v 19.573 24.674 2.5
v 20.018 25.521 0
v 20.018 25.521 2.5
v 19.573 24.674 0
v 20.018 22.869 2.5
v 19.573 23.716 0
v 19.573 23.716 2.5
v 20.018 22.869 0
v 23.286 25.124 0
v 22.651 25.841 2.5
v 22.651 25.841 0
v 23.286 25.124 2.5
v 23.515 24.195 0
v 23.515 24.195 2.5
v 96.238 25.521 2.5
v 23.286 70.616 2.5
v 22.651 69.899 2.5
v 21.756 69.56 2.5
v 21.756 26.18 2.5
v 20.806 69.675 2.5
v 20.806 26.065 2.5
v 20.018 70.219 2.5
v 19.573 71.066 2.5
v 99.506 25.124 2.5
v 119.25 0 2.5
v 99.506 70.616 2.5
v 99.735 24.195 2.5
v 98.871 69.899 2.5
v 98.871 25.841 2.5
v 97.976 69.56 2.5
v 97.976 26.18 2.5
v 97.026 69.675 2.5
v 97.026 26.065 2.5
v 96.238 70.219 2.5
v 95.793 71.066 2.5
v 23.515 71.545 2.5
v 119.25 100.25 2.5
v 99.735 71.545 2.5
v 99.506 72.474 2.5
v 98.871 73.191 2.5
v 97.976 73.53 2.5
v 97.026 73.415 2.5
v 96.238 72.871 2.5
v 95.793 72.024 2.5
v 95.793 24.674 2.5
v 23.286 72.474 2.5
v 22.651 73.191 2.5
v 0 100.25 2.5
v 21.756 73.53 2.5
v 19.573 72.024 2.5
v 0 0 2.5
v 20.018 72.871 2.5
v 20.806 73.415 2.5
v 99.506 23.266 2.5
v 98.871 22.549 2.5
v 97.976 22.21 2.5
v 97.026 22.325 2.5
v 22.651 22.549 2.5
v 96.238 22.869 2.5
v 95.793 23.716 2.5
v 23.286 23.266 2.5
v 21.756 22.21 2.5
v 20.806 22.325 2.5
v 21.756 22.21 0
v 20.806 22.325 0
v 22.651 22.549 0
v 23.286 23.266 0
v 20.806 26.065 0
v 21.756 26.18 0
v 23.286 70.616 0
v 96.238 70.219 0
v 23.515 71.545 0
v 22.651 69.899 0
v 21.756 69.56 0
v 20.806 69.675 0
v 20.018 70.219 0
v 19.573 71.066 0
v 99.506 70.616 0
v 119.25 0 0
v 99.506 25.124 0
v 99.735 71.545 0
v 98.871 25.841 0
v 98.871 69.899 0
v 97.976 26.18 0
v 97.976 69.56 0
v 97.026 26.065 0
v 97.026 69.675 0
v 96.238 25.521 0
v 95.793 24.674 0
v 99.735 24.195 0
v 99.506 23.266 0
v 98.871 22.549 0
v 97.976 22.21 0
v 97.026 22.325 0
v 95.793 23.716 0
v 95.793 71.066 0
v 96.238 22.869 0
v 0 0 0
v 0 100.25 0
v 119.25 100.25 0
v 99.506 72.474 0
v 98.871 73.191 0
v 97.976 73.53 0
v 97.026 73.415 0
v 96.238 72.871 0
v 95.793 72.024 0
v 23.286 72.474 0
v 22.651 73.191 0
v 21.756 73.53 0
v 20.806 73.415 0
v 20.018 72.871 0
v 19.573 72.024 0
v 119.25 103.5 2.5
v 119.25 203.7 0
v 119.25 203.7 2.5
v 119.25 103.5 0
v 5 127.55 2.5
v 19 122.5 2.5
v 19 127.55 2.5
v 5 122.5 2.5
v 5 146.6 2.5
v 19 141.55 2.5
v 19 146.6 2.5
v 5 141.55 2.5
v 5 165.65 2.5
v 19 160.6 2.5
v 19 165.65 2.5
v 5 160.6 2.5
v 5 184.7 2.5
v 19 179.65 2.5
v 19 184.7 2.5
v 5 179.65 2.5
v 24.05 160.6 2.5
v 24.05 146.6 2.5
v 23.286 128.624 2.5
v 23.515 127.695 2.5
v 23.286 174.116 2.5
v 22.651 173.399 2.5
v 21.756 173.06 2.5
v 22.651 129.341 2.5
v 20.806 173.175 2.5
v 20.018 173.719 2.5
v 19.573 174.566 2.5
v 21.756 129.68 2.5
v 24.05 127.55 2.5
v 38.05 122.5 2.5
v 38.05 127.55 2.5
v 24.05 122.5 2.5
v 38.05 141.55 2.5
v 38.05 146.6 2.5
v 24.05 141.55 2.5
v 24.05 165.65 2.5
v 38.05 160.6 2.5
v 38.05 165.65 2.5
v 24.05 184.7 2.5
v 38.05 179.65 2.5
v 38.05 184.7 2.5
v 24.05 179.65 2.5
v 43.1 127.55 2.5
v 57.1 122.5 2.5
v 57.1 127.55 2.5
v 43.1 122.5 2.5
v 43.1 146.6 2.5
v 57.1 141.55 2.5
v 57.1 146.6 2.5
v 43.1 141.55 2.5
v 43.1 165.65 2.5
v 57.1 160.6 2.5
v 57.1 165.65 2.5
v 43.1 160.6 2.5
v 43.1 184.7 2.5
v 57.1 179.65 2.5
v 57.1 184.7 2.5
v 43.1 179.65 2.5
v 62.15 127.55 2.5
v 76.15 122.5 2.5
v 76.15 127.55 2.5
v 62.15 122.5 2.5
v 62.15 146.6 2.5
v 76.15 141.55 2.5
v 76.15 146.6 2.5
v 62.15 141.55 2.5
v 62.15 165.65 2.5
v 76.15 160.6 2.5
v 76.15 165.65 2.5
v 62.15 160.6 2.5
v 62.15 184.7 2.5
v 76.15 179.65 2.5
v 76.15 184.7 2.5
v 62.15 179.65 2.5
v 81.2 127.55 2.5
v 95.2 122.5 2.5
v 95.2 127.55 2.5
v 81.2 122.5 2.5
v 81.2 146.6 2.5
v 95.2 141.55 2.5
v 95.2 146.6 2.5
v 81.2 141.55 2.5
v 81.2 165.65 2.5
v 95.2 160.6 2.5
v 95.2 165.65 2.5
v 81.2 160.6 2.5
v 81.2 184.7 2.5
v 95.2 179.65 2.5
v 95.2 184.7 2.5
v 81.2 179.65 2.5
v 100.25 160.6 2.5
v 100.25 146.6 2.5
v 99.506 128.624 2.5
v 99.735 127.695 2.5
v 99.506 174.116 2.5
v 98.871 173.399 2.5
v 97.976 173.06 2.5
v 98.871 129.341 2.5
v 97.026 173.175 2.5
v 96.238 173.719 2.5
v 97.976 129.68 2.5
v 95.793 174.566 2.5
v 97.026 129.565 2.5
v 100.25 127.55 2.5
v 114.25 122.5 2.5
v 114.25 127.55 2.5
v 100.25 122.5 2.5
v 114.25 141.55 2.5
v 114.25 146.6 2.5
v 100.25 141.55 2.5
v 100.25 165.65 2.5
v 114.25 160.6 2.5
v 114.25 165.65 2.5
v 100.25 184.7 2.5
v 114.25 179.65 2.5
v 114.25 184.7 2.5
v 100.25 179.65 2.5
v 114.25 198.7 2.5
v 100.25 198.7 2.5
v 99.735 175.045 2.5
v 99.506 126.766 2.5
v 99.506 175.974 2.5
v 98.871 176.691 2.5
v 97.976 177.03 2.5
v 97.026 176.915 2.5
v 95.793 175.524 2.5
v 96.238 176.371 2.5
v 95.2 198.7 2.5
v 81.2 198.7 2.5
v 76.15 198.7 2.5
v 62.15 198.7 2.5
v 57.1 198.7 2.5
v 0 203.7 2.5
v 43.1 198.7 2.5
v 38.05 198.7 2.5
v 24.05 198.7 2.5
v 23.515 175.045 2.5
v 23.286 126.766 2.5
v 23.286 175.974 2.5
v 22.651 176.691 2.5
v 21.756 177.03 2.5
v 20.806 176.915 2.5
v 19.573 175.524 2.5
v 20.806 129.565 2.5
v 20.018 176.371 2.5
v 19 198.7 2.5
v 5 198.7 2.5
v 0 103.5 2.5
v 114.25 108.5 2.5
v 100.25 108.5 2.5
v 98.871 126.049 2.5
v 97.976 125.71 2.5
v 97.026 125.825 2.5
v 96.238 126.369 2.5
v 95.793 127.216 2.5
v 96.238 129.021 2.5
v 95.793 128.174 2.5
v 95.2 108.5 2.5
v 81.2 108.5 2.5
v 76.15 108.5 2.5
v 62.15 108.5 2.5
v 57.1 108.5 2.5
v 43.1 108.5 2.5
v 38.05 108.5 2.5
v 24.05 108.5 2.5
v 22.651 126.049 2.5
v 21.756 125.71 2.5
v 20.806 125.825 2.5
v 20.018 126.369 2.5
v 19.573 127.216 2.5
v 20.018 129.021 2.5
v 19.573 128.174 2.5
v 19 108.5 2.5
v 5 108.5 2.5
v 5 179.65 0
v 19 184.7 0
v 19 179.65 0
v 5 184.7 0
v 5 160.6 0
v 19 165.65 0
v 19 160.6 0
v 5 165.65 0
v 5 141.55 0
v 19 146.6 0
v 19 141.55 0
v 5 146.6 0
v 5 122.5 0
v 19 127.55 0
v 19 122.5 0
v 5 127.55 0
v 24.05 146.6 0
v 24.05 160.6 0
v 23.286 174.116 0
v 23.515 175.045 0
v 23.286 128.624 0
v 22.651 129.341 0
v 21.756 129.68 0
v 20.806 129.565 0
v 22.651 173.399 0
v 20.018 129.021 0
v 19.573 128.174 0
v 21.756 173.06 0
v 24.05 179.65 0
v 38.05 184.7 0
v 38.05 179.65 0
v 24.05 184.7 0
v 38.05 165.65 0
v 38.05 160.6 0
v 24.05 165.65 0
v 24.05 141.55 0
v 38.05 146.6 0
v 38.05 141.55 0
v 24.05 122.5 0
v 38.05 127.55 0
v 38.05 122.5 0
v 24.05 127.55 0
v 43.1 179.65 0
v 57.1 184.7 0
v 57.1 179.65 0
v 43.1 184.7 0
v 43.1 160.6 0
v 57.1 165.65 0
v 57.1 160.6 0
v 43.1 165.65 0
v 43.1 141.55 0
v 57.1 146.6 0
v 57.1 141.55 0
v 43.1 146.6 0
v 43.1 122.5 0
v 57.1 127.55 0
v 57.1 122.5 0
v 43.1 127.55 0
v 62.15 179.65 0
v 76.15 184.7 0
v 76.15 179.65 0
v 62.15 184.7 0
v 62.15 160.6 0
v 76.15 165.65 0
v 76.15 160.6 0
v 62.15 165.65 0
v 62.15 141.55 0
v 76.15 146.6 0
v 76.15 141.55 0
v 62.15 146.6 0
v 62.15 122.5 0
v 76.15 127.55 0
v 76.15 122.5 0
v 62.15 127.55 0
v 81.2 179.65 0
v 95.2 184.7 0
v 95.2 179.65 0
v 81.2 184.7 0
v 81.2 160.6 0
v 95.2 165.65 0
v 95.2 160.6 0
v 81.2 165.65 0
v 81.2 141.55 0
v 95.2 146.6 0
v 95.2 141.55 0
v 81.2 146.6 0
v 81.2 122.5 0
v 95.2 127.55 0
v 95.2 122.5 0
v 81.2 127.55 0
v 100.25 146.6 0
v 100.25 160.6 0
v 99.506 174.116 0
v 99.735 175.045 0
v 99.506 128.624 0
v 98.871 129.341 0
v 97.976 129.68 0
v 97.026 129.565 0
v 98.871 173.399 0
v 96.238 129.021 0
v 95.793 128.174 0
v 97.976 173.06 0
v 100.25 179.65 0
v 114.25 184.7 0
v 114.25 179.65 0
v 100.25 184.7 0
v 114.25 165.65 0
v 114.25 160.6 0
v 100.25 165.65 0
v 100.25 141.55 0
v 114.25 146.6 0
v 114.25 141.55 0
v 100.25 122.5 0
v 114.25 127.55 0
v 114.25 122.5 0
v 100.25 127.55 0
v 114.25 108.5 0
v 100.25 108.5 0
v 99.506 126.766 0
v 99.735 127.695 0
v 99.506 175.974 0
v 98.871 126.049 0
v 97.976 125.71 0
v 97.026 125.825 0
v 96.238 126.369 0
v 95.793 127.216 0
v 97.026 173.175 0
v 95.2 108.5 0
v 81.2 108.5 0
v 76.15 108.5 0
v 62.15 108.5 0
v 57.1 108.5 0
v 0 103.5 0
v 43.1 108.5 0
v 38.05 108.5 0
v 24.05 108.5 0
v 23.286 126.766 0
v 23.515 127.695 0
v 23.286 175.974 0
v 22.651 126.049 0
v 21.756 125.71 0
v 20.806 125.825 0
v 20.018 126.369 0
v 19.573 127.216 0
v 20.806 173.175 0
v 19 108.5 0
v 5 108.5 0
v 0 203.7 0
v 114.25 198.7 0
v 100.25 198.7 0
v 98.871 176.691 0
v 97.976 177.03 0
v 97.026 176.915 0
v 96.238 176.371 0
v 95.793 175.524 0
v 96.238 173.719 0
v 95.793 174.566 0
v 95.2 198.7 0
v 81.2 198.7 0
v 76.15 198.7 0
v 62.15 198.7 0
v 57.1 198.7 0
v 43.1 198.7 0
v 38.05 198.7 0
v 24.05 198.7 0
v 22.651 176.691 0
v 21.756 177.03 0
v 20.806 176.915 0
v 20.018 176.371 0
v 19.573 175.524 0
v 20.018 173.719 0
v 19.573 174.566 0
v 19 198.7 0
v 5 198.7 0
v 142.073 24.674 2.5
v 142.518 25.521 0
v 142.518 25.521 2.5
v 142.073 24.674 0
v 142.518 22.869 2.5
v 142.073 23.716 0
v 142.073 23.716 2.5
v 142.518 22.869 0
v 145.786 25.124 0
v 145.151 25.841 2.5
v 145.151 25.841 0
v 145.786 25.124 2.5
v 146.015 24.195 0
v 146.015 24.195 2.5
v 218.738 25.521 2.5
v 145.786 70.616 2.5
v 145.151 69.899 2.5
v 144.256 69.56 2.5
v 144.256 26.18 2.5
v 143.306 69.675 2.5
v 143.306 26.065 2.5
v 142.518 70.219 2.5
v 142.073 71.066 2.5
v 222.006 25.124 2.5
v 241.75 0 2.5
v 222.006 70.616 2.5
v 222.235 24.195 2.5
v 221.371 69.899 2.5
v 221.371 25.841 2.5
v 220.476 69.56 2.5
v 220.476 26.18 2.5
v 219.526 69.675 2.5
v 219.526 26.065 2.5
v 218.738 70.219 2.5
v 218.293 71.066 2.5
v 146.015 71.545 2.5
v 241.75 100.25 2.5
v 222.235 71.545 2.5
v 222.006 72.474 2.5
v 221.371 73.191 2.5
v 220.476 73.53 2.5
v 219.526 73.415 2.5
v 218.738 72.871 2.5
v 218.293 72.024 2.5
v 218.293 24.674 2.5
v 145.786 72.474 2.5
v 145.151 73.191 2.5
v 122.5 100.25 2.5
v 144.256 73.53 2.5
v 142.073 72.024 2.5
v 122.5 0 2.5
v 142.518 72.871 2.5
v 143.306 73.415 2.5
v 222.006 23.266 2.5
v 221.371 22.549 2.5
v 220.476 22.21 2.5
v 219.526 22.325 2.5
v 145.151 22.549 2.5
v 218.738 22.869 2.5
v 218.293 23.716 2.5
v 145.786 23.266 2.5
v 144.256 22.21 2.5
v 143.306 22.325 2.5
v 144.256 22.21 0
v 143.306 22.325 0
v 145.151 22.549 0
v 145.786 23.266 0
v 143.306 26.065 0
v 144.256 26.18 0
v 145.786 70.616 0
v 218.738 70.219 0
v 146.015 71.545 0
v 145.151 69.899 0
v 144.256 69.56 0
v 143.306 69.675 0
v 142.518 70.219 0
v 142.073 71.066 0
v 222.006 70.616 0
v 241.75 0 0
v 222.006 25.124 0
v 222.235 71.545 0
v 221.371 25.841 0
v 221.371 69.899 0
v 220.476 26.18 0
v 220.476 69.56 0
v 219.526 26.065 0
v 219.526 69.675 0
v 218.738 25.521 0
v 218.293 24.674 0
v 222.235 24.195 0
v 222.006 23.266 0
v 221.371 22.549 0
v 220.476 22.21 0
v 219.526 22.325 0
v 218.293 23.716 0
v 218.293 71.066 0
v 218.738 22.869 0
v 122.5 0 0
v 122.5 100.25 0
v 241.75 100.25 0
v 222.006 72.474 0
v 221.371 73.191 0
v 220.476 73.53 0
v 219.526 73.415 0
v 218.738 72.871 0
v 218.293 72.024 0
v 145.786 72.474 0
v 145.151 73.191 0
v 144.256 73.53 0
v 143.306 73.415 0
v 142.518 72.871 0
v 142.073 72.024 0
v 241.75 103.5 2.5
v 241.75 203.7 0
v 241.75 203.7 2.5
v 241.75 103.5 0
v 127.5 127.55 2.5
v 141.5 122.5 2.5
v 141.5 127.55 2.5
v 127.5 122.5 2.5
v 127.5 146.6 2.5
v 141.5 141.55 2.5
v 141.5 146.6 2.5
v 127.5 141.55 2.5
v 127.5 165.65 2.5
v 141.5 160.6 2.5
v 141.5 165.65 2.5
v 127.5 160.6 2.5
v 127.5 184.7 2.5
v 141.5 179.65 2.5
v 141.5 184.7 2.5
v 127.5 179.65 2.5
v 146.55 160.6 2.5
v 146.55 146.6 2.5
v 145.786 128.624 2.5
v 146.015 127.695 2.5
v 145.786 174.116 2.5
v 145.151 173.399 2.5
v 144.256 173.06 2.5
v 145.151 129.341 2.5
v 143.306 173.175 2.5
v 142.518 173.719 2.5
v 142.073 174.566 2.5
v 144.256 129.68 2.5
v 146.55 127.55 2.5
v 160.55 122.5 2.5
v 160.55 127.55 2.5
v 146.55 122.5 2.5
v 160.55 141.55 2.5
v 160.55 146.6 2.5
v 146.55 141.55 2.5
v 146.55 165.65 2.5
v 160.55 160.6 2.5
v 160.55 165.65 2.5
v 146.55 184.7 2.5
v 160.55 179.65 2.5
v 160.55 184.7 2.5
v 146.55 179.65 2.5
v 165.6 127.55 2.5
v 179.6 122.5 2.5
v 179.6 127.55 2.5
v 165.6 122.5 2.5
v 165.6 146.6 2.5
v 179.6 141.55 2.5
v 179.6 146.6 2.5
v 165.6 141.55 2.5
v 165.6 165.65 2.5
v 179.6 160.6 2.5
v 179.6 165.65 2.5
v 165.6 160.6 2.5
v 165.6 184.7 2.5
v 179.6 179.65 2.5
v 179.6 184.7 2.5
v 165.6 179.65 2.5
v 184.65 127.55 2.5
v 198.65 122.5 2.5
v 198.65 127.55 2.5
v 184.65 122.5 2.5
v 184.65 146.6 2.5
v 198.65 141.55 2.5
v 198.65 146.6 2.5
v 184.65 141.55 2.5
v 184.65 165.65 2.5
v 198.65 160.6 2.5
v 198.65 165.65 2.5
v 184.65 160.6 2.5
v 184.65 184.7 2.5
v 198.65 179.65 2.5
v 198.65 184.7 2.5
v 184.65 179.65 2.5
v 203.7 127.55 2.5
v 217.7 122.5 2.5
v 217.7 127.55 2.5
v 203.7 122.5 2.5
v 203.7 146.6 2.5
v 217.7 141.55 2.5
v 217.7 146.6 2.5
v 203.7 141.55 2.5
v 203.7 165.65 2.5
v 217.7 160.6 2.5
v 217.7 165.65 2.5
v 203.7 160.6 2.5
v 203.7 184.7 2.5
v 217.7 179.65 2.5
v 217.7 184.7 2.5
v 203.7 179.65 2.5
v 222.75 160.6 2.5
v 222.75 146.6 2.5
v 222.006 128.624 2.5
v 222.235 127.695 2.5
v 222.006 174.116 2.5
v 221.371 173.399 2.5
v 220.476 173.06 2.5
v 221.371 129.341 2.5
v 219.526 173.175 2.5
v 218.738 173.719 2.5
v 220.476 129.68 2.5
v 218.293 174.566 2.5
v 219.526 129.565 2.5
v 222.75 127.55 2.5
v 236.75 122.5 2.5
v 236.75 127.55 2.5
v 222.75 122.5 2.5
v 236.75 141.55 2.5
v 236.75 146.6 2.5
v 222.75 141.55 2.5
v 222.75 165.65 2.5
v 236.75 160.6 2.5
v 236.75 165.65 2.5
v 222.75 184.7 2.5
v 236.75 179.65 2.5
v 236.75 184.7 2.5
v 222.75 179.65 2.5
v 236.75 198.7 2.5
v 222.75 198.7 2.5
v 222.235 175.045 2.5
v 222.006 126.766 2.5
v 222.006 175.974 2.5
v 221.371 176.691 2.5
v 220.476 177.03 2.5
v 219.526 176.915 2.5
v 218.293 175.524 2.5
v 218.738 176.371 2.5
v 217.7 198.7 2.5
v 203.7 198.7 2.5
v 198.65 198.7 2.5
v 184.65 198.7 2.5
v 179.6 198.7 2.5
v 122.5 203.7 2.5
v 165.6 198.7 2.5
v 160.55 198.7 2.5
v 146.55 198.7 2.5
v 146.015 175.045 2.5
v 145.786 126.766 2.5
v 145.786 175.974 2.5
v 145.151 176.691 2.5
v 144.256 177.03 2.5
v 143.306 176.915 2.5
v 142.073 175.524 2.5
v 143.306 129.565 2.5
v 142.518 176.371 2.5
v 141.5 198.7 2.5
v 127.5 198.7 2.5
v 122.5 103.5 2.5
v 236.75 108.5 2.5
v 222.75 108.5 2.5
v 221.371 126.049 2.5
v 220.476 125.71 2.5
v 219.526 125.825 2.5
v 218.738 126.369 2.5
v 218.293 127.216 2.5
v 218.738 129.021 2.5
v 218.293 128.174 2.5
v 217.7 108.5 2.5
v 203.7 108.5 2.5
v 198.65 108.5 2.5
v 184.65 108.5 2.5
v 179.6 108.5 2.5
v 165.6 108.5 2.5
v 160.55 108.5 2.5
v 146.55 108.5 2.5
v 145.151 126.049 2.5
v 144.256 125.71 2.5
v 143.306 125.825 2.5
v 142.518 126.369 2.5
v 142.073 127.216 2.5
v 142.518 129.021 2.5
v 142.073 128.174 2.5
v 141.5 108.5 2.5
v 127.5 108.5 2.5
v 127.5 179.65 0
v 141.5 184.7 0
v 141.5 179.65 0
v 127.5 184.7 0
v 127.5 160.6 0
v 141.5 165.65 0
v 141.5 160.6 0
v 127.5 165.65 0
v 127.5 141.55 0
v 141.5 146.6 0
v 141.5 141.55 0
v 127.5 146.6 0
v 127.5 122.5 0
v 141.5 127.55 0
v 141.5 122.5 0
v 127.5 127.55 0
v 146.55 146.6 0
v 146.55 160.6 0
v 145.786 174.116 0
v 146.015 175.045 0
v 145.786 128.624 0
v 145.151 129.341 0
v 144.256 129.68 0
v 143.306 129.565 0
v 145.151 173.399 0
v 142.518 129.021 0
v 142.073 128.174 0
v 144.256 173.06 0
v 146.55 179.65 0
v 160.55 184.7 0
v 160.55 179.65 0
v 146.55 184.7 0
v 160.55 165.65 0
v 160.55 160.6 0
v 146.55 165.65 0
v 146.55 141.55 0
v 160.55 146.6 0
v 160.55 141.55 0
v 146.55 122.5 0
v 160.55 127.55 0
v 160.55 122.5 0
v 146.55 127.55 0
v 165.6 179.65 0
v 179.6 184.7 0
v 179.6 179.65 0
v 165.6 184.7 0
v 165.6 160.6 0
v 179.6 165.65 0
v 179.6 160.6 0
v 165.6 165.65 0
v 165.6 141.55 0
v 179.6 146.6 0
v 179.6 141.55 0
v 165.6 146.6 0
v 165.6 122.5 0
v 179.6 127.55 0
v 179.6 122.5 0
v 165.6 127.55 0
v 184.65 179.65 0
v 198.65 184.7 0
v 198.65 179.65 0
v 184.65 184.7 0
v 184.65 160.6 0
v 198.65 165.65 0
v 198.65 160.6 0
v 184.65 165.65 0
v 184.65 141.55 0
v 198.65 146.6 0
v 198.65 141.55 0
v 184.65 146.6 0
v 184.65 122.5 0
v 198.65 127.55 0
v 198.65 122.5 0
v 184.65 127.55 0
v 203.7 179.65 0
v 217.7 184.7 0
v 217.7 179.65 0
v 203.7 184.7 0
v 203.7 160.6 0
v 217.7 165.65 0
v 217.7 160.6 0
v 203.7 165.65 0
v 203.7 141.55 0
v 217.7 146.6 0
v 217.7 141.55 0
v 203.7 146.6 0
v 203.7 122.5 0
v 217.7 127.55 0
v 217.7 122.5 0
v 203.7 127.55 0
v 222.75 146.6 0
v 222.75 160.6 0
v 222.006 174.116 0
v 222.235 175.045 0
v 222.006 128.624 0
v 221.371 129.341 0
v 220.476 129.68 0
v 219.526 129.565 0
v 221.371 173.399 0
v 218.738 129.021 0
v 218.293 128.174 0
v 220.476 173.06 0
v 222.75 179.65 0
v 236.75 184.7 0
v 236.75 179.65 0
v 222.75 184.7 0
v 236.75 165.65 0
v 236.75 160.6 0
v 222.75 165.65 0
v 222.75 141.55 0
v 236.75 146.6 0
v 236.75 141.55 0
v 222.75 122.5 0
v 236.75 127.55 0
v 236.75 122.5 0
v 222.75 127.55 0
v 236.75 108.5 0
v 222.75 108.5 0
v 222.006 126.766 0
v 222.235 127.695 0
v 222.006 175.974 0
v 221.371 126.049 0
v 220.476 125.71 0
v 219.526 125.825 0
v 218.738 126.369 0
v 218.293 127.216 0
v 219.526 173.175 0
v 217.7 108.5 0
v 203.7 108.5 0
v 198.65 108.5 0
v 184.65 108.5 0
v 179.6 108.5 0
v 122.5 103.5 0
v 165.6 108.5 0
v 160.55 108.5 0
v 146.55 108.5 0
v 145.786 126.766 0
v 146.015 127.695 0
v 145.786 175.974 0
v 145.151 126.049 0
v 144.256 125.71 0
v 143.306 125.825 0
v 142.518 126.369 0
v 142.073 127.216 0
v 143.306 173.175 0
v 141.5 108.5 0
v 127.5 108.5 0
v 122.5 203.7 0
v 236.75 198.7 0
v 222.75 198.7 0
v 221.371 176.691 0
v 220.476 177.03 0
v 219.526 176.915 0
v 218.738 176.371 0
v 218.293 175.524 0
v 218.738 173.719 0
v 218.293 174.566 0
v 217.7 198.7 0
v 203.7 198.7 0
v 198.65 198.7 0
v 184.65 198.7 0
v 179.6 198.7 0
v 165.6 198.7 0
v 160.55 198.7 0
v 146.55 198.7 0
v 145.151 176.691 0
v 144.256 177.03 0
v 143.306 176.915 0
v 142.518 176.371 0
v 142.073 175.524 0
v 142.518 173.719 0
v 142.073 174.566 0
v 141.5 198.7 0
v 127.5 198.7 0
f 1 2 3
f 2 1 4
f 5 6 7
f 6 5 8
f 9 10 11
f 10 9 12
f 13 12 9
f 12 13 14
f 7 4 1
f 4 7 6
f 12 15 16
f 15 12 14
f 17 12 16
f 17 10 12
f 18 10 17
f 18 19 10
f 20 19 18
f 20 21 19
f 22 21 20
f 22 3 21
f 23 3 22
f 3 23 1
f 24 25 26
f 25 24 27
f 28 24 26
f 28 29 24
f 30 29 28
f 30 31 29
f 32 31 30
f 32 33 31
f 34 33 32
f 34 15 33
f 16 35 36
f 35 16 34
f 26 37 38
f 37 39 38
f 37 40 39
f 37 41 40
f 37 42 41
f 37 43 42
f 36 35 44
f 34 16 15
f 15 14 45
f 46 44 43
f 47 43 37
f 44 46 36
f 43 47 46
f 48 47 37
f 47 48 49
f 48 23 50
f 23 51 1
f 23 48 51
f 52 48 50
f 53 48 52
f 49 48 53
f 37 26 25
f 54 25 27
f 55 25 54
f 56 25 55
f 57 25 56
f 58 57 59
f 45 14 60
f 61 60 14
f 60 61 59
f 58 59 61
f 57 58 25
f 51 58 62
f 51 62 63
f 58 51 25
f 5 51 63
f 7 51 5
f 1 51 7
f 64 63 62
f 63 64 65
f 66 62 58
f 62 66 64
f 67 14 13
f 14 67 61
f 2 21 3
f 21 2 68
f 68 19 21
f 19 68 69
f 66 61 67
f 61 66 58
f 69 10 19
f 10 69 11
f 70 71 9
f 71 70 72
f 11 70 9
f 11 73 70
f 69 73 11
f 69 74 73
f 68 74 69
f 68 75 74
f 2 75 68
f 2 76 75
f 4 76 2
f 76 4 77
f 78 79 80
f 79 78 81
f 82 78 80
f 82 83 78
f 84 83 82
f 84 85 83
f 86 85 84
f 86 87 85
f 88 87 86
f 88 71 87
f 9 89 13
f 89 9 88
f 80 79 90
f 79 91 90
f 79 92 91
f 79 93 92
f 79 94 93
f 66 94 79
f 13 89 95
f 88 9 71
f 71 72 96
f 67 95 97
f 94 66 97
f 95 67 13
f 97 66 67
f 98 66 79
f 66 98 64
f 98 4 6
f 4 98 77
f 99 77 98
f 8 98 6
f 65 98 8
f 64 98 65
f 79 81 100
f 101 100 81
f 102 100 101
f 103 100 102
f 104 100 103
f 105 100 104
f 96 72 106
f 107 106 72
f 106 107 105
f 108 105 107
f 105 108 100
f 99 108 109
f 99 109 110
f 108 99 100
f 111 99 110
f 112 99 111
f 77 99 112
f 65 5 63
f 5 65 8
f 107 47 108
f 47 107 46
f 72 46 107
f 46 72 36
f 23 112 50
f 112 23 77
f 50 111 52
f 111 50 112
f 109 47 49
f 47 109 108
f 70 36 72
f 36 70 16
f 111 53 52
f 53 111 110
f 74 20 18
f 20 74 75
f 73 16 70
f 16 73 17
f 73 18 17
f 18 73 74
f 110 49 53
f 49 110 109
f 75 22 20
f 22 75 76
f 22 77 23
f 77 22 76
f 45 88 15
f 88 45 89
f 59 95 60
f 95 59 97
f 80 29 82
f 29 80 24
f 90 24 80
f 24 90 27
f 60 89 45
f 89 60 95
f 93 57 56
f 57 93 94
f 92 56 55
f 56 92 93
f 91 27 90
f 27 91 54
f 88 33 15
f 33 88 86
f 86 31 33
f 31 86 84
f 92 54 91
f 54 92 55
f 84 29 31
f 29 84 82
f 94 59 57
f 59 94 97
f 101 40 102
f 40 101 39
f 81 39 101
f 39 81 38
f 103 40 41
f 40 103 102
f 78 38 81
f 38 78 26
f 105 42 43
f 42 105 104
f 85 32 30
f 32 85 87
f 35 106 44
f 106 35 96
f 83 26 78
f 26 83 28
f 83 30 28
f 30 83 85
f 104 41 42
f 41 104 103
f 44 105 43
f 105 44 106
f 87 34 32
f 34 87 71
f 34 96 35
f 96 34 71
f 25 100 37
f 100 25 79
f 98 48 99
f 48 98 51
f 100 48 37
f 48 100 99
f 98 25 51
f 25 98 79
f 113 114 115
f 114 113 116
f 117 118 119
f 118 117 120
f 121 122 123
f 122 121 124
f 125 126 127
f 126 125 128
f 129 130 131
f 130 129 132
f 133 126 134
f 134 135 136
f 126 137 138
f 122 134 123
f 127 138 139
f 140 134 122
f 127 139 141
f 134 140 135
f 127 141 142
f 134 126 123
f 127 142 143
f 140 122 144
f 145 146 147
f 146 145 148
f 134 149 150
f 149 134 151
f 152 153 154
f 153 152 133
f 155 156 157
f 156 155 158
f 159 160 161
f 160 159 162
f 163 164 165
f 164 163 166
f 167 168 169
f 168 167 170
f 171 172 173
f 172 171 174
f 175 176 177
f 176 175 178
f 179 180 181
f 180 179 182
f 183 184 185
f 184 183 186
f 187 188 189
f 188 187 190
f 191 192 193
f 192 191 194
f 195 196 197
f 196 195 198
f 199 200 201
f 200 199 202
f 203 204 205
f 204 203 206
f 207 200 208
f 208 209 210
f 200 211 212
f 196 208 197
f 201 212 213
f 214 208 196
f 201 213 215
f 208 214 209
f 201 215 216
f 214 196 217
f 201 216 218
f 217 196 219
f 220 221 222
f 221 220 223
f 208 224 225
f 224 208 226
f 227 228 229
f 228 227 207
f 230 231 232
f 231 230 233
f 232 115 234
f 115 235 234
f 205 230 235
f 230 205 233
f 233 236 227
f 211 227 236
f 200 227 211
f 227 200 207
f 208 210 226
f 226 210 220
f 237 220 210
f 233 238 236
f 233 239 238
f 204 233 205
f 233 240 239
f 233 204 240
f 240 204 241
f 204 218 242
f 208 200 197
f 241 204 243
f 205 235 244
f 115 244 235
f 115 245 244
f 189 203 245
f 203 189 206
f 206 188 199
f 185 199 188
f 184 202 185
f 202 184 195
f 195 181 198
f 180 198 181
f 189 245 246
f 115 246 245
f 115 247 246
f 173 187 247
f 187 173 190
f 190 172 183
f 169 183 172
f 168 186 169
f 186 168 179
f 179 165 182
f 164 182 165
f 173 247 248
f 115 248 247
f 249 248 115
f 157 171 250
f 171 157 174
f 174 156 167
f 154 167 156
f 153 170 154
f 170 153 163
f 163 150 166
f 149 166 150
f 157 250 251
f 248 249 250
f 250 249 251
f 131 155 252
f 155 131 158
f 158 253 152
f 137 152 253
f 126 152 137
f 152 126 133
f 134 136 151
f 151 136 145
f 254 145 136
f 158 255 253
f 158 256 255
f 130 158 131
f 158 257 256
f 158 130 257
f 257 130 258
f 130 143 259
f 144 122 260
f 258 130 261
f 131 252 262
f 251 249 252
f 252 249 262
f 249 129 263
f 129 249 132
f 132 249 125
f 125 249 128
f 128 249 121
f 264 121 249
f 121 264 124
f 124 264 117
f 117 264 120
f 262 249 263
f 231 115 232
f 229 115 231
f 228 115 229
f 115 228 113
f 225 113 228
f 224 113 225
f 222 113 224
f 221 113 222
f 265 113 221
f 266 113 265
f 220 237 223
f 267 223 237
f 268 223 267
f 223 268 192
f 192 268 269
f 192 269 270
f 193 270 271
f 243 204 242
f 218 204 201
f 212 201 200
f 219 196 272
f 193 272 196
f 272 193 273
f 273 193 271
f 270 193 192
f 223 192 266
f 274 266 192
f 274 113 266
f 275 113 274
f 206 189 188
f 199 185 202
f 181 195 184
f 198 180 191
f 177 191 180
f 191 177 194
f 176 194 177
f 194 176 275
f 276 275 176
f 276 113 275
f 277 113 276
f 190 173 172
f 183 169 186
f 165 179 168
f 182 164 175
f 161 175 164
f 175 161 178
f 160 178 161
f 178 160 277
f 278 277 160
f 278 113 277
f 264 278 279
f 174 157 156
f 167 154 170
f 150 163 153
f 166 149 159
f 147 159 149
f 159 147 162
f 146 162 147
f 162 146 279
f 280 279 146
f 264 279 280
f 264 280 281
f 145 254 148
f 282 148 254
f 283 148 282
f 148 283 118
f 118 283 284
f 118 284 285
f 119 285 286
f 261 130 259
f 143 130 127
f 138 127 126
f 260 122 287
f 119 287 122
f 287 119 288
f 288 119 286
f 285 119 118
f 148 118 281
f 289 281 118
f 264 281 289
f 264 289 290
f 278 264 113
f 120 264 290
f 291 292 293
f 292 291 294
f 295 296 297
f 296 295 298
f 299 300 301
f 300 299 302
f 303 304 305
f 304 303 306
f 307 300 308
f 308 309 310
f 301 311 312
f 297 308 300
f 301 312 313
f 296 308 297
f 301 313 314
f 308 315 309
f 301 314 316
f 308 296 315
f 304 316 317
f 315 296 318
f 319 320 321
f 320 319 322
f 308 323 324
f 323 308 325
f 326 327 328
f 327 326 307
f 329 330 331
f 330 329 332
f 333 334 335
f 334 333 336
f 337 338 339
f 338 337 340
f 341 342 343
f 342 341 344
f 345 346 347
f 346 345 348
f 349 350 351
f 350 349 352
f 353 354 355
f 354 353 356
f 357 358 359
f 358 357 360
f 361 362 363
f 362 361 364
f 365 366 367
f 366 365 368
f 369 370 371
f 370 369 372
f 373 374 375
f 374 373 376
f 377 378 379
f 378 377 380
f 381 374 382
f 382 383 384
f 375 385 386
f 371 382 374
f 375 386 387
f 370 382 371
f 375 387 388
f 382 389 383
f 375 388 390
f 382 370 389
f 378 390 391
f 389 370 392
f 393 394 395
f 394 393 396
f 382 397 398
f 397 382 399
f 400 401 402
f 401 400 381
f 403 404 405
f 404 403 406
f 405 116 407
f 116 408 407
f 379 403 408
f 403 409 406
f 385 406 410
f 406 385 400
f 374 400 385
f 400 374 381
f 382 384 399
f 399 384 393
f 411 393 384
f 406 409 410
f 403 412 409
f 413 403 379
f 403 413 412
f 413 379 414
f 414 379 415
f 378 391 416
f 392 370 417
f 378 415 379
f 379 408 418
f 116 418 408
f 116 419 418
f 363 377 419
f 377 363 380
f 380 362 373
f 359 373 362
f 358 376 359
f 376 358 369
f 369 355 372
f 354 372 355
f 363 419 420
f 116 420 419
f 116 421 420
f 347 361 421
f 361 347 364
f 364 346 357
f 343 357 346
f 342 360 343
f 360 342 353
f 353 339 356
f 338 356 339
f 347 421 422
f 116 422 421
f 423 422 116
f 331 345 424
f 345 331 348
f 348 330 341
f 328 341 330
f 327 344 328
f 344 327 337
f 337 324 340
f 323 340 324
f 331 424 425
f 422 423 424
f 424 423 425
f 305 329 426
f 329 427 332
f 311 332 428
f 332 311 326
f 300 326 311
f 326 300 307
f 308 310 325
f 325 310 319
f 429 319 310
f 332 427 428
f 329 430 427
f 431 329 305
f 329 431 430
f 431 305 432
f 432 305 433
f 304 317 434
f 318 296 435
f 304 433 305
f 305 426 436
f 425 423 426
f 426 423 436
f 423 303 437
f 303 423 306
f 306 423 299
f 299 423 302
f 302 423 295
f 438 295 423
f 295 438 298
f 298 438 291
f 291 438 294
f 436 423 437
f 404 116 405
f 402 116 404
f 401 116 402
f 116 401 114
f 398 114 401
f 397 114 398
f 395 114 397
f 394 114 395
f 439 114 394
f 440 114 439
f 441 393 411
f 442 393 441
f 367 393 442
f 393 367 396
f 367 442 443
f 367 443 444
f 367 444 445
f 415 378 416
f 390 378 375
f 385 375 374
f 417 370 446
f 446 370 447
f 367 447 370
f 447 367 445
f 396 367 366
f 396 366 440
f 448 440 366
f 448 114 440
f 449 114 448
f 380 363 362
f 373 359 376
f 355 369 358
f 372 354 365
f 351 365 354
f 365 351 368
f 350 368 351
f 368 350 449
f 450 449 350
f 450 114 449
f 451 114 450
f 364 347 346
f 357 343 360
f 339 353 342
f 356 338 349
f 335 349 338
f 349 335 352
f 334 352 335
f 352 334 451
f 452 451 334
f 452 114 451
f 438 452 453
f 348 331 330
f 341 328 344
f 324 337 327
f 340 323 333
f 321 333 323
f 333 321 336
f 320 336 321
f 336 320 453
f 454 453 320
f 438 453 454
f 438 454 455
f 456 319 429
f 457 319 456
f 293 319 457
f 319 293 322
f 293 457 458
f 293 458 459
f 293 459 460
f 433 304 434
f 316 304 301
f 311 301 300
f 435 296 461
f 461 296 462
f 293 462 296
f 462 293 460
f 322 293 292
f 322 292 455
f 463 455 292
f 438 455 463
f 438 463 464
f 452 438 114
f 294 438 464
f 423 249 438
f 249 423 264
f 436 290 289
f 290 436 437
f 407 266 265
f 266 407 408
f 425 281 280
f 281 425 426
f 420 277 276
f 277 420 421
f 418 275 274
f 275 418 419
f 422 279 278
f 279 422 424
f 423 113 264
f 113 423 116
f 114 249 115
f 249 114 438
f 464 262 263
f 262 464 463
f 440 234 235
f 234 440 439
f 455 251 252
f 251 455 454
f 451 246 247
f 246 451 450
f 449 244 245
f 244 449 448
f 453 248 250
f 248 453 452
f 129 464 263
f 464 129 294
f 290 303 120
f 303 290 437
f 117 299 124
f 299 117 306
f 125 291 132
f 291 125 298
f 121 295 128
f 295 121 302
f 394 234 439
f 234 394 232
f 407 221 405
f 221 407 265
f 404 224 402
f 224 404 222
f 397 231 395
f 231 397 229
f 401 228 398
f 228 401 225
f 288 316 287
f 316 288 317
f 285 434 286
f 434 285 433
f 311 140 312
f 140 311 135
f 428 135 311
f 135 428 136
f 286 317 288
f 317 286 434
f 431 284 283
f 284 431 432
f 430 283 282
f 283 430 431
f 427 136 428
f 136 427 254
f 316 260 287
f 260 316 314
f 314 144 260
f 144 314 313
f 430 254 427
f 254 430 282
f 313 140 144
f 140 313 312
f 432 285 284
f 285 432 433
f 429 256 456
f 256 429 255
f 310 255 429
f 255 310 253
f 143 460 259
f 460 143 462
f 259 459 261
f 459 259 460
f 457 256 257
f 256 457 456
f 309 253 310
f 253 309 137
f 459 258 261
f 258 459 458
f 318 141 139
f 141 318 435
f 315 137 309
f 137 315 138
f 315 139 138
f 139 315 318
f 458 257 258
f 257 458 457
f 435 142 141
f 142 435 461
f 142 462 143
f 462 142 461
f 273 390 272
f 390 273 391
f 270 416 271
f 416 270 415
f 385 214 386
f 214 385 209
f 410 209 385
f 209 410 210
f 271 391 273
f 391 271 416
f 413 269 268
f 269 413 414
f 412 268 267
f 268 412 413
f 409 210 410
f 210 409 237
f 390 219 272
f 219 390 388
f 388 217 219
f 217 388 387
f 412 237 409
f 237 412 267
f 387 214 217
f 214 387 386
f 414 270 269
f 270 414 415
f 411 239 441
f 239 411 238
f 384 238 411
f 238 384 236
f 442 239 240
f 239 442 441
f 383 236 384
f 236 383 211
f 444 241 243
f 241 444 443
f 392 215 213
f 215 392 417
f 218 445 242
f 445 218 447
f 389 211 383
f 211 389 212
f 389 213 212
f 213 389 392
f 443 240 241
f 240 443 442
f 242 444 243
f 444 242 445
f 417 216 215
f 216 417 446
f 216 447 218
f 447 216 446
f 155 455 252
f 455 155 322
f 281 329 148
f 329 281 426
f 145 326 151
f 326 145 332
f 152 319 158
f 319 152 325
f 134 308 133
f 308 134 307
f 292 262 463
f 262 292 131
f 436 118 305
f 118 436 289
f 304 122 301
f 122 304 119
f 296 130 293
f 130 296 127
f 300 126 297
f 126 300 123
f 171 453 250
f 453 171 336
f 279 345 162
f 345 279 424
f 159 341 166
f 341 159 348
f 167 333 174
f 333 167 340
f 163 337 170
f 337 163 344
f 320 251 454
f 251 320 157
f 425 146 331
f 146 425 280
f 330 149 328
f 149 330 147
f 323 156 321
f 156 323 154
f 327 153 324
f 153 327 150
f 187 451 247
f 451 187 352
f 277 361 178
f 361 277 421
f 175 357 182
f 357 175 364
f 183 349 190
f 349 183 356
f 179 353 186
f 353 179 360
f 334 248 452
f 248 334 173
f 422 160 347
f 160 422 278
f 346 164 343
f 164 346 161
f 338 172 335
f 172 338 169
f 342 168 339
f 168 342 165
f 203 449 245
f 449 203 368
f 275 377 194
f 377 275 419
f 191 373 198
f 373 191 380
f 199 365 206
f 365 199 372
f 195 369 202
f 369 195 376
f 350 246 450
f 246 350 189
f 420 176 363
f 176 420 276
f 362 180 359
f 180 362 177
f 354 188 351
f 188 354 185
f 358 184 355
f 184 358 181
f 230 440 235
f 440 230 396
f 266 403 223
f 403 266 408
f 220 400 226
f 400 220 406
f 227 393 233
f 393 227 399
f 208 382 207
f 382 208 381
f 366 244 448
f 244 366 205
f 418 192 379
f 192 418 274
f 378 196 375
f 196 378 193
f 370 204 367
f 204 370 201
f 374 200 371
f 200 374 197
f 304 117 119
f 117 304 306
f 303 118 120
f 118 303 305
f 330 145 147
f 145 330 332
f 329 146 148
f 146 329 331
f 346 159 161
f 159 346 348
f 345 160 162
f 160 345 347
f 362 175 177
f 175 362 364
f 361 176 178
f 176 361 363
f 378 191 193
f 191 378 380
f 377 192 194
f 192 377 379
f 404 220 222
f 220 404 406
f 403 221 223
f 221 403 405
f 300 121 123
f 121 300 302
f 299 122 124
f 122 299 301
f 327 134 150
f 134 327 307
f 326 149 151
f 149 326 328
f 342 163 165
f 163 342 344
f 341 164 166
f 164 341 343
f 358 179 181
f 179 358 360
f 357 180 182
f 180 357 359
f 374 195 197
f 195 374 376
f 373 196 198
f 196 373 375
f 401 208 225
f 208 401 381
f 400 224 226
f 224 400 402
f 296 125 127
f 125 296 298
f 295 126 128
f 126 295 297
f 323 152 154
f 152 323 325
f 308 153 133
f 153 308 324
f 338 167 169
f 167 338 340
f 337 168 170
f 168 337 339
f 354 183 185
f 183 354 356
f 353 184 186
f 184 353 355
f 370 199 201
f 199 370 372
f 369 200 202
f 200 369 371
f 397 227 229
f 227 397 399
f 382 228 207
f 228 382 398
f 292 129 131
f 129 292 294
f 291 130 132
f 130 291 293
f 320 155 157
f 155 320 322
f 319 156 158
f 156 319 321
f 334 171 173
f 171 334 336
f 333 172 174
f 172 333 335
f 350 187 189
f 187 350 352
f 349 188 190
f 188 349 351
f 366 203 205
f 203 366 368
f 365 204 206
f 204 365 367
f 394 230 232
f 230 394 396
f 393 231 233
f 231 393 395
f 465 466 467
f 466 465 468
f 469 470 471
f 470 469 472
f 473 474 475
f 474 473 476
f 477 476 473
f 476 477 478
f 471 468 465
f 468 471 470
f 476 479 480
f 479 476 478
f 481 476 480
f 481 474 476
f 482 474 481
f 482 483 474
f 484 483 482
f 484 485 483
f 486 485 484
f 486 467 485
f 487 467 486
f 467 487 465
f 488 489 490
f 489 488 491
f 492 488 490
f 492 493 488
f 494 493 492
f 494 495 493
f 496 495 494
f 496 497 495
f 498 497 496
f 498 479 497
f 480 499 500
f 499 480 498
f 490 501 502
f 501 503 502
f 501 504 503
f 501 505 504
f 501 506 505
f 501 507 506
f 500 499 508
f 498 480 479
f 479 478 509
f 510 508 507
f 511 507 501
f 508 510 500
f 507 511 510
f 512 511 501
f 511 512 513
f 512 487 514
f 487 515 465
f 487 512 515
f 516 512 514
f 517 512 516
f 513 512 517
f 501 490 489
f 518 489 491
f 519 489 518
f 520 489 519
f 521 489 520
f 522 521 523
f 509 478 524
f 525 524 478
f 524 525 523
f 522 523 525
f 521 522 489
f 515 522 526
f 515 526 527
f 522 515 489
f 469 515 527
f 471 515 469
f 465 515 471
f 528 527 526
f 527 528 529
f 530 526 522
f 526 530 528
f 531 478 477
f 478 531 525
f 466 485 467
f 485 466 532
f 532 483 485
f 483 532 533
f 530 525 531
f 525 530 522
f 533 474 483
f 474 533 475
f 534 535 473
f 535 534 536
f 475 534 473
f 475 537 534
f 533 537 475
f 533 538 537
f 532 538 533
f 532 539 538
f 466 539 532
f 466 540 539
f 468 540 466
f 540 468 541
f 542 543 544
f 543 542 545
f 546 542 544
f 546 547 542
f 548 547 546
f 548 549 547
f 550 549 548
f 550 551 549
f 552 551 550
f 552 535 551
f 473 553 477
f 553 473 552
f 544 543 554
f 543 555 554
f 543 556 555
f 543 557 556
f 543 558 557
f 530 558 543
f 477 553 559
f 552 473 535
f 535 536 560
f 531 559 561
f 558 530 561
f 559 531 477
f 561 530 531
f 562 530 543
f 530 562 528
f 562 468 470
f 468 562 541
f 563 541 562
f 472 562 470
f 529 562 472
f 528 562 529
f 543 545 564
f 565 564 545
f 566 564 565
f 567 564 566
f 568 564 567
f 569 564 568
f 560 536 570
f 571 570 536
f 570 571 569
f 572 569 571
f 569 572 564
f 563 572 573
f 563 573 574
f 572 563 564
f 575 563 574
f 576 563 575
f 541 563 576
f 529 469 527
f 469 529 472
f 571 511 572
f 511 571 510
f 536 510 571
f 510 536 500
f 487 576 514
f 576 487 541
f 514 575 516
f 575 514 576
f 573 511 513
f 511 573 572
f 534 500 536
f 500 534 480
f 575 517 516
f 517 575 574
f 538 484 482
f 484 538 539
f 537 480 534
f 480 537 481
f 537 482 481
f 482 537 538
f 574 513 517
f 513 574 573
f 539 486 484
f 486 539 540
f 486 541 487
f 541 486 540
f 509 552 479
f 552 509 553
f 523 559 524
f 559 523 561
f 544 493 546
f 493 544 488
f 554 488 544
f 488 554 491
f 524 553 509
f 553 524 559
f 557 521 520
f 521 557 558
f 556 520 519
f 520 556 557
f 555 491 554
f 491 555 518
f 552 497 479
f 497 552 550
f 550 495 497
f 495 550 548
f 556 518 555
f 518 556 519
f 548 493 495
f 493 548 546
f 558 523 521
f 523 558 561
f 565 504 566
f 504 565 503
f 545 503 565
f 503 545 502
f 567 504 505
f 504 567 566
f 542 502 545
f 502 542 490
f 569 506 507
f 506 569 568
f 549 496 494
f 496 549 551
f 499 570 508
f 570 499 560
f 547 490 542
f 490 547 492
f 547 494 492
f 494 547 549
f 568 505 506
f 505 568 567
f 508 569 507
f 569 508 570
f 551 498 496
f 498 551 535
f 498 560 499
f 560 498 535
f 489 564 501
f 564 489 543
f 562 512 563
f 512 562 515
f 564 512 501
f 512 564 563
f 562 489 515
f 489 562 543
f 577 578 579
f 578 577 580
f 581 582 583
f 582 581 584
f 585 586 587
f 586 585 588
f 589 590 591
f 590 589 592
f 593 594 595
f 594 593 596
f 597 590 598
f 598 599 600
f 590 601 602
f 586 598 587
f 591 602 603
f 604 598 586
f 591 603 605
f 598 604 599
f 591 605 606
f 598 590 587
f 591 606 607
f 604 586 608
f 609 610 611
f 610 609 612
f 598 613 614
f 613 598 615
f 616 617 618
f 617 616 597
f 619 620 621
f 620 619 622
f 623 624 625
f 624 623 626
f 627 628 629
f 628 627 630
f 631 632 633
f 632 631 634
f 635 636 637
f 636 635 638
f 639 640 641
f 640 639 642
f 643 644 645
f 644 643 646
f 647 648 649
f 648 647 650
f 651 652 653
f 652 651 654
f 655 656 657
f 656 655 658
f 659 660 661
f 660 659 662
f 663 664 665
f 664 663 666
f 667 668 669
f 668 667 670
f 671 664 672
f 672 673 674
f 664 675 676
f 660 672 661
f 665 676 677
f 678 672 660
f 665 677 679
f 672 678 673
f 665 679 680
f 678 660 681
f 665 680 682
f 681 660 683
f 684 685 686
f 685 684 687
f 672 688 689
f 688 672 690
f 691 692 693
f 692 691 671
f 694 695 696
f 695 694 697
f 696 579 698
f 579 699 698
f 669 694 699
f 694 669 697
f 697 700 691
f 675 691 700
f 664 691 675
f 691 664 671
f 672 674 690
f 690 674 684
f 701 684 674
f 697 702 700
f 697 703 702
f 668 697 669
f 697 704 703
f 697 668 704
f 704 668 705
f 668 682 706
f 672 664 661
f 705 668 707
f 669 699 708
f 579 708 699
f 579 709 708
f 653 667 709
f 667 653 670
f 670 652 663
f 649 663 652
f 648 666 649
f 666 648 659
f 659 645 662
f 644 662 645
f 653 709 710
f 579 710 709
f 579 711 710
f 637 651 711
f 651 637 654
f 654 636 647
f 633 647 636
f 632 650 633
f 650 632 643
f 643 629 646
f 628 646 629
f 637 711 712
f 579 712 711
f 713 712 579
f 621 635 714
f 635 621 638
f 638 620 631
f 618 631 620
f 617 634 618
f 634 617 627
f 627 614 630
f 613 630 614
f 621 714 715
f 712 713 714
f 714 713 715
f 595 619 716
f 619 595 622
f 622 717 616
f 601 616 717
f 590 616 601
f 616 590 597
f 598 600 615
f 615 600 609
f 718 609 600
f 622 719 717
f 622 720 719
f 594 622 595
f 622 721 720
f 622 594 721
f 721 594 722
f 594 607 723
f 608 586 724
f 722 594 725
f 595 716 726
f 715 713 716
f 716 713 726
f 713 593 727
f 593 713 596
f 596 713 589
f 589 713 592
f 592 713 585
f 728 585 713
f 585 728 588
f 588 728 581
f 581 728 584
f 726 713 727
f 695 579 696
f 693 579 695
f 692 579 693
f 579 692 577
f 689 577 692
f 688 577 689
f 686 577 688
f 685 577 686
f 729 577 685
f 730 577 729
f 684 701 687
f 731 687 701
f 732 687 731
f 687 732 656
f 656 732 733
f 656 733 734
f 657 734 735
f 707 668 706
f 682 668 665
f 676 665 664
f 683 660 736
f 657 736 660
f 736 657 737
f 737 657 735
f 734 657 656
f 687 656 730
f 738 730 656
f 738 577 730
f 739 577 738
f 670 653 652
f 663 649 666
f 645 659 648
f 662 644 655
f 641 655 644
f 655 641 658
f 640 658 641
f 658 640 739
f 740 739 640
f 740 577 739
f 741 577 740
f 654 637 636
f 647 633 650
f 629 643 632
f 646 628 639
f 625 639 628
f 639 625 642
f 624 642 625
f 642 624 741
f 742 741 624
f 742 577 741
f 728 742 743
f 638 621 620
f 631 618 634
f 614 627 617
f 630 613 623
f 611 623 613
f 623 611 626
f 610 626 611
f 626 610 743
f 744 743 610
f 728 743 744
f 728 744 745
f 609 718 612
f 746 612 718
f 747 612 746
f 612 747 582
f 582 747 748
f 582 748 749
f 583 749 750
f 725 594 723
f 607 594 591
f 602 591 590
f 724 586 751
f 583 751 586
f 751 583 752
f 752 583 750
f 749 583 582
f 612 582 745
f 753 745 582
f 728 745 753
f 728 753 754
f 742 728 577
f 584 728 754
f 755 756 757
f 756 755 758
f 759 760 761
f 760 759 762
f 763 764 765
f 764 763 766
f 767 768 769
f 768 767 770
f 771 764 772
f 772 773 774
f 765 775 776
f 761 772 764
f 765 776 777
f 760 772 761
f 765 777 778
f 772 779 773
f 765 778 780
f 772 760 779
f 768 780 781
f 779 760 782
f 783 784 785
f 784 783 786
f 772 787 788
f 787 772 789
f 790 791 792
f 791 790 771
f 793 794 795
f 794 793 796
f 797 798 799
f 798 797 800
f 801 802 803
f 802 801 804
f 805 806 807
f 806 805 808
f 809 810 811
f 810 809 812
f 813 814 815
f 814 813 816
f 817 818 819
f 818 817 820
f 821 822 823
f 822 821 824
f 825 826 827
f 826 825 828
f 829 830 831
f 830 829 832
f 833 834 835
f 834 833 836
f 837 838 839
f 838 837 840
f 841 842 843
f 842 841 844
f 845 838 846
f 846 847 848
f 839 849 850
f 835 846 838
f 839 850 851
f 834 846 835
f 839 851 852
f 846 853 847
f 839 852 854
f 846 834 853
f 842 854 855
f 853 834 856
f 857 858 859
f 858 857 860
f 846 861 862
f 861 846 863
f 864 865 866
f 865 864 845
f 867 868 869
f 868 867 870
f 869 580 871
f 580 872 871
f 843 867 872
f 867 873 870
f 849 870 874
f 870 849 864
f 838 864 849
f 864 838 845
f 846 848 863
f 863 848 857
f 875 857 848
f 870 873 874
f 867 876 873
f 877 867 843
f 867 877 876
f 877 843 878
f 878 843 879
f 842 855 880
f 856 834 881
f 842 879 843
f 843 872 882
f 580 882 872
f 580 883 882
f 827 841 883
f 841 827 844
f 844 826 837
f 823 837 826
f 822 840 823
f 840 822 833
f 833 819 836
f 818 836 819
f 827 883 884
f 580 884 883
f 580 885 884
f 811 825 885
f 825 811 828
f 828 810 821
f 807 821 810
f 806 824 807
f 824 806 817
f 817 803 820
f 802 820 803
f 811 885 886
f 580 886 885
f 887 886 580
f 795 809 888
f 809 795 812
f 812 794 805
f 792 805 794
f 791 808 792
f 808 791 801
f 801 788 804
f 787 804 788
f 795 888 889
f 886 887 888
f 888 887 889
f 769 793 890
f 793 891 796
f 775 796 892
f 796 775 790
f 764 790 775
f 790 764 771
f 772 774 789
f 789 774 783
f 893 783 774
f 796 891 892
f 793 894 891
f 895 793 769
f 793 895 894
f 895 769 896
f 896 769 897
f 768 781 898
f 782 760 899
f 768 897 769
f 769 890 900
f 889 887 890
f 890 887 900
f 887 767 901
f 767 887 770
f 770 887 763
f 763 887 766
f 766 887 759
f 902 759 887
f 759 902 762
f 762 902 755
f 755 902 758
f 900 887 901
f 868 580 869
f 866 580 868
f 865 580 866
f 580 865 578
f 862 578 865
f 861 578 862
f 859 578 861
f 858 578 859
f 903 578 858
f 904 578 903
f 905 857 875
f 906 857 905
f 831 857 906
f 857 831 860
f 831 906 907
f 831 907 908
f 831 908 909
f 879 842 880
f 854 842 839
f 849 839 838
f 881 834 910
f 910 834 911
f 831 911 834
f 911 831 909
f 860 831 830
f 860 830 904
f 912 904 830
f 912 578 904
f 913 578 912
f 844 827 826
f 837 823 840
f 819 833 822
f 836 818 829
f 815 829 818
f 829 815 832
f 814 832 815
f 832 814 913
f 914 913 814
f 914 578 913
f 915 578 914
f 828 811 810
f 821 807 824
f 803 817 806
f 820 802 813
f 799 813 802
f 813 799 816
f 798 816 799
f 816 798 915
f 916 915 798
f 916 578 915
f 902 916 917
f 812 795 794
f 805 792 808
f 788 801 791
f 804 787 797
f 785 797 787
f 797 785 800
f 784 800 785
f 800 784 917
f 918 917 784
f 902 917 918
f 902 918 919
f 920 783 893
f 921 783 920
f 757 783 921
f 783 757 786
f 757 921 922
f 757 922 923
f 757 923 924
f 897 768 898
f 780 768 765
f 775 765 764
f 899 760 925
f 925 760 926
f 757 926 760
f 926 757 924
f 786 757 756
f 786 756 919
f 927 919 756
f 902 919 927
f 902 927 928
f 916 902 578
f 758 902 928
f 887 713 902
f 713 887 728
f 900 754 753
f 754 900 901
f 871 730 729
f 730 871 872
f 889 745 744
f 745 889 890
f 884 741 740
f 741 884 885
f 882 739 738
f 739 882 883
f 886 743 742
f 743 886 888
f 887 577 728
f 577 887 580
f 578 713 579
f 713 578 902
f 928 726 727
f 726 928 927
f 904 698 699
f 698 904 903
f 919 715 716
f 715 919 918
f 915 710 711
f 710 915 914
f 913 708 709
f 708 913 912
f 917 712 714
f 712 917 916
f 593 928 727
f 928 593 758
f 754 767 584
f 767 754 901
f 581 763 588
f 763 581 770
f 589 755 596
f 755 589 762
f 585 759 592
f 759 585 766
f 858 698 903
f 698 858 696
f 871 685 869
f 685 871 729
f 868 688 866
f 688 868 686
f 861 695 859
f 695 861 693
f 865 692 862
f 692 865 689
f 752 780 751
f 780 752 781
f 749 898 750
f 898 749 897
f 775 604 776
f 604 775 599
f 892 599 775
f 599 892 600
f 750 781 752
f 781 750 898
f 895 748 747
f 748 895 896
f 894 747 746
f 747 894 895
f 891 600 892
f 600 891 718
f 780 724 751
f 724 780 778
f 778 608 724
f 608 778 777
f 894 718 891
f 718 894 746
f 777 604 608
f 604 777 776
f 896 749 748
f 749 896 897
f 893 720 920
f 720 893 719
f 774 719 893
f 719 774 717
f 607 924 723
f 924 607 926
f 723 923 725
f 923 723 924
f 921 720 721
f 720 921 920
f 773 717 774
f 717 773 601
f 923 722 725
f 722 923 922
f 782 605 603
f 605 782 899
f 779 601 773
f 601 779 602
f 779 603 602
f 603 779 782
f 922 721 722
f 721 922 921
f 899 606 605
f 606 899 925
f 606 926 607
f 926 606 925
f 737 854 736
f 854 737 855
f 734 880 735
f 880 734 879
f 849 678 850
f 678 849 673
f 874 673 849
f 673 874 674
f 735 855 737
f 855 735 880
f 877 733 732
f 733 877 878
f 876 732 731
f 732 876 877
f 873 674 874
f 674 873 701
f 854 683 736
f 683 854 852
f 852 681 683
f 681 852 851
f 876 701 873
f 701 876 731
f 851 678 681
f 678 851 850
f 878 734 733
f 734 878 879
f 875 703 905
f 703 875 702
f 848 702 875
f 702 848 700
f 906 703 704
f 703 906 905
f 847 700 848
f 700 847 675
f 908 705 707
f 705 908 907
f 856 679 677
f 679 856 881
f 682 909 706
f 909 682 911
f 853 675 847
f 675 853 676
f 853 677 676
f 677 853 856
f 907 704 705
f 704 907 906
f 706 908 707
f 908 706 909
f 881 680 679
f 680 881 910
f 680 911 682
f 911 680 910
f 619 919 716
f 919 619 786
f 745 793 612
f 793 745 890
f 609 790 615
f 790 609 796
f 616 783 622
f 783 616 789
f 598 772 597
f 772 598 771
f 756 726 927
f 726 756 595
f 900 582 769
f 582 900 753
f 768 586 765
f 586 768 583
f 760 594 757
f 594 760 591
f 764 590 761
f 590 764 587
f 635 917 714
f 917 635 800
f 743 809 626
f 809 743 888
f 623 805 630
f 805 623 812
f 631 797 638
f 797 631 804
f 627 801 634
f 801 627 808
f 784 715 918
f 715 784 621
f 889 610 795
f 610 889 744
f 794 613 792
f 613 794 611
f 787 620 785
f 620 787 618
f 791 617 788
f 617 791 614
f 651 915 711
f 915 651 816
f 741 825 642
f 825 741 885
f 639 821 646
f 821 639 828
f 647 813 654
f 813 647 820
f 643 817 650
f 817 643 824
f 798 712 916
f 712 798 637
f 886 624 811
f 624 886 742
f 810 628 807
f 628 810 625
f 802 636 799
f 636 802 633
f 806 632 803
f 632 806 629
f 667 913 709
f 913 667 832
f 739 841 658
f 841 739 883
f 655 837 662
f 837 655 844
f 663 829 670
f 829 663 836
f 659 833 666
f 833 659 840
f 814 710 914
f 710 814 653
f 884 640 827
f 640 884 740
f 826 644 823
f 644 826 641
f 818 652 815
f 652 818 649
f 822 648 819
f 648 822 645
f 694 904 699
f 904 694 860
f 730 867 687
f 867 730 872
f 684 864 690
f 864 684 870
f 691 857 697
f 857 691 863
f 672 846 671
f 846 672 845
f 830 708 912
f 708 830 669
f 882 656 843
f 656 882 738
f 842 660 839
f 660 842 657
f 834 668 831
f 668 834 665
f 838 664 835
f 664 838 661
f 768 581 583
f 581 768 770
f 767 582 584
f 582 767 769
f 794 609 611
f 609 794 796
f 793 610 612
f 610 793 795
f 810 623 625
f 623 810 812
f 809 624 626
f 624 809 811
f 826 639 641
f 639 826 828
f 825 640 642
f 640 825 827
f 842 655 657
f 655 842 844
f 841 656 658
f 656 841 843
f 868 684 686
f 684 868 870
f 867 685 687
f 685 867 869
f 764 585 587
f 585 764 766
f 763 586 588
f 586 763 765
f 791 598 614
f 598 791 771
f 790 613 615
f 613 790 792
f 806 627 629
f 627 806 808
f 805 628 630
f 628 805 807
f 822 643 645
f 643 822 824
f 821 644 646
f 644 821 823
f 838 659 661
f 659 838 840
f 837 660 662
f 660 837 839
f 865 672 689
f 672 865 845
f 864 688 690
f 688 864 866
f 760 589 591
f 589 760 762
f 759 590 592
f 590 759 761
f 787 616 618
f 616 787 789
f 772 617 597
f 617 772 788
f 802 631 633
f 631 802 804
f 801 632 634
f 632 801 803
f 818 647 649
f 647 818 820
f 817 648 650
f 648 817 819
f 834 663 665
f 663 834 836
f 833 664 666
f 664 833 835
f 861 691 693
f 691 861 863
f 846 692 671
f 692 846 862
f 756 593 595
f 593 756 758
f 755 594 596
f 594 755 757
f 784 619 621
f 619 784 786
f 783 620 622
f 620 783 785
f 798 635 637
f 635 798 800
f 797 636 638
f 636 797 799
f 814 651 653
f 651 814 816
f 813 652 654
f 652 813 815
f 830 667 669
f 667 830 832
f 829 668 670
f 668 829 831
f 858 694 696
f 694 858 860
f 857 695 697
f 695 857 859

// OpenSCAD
// pcb dimensions
pcb_width     = 110.5;
pcb_height    =  91.5;
pcb_depth     =   1.6;
pcb_margin    =   0.625;

// layer dimensions
layer_depth   =   2.5;
border_width  =   5.0;
layers        =   3.0;

// switch plate dimensions
columns       =   6.0;
rows          =   5.0;
switch_width  =  14.0;
switch_depth  =   5.0;
switch_gap    =   5.05;

grid_width  = columns * (switch_width + switch_gap) - switch_gap;
grid_height = rows * (switch_width + switch_gap) - switch_gap;

screw_diameter =  2.0;
    
// elevations
plate_elevation = (1 + layers) * layer_depth;
pcb_elevation   = plate_elevation - pcb_depth - switch_depth + layer_depth;

vector   = true;
double   = true;
switches = false;

$fs = 1;

module screw_holes(depth, radius, elevation) {
    translate([border_width - pcb_margin + 17.14, border_width - pcb_margin + 19.82, elevation])
        cylinder(h=depth, r=radius);
    translate([border_width - pcb_margin + 17.14, border_width - pcb_margin + pcb_height - 24.33, elevation])
        cylinder(h=depth, r=radius);
    translate([border_width - pcb_margin + pcb_width - 17.14, border_width - pcb_margin + 19.82, elevation])
        cylinder(h=depth, r=radius);
    translate([border_width - pcb_margin + pcb_width - 17.14, border_width - pcb_margin + pcb_height - 24.33, elevation])
        cylinder(h=depth, r=radius);
}

module pcb() {
    difference() {
        // pcb
        translate([border_width - pcb_margin, border_width - pcb_margin, pcb_elevation])
            color("green")
            cube([pcb_width, pcb_height, pcb_depth]);
        
        // holes
        screw_holes(pcb_depth, 7.05/2, pcb_elevation);
    }
}

module base_plate() {
    difference() {
        color("silver")
            cube([pcb_width + (border_width - pcb_margin) * 2, pcb_height + (border_width - pcb_margin) * 2, layer_depth]);
        
        screw_holes(layer_depth, screw_diameter, 0);
    }
}

module key_switch(x, y) {
    x_trans = border_width + x * (switch_width + switch_gap);
    y_trans = border_width + y * (switch_width + switch_gap);
    // base
    translate([x_trans, y_trans, pcb_elevation + pcb_depth])
        color("white")
        cube([switch_width, switch_width, switch_depth]);
    // top
    translate([x_trans - 0.8, y_trans - 0.8, pcb_elevation + pcb_depth + switch_depth])
        color("lightgray")
        cube([15.6, 15.6, 6.6]);
    // plunger
    translate([x_trans + 5.2, y_trans + 5.2, pcb_elevation + pcb_depth + switch_depth + 6.6])
        color("brown")
        cube([3.6, 3.6, 3.6]);
}

module border_plate(elevation) {
    grid_width = columns * (switch_width + switch_gap) - switch_gap;
    grid_height = rows * (switch_width + switch_gap) - switch_gap;
    beam_width = grid_width + border_width * 2;
    beam_height = grid_height;
    // south border
    translate([0, 0, elevation])
        color("silver")
        cube([beam_width, border_width, layer_depth]);
    // north border
    translate([0, border_width + beam_height, elevation])
        color("silver")
        cube([beam_width, border_width, layer_depth]);
    // east border
    translate([0, border_width, elevation])
        color("silver")
        cube([border_width, beam_height, layer_depth]);
    // west border
    translate([beam_width - border_width, border_width, elevation])
        color("silver")
        cube([border_width, beam_height, layer_depth]);
}

module key_plate() {
    // borders
    border_plate(plate_elevation);

    // columns
    for (column=[1:1:columns-1]) {
        difference() {
            translate([column * (switch_width + switch_gap) + border_width - switch_gap, border_width, plate_elevation])
                color("silver")
                cube([switch_gap, grid_height, layer_depth]);
            
            // holes
            screw_holes(layer_depth, screw_diameter, plate_elevation);
        }
    }

    // rows
    for (row=[1:1:rows-1]) {
        // make each bit of row to prevent overlapping because I'm obsessive-compulsive
        for (column=[0:1:columns-1]) {
            difference() {
                translate([border_width + (switch_width + switch_gap) * column, row * (switch_width + switch_gap) + border_width - switch_gap, plate_elevation])
                    color("silver")
                    cube([switch_width, switch_gap, layer_depth]);
                
                // holes
                screw_holes(layer_depth, screw_diameter, plate_elevation);
            }
        }
    }
}

// build keyboard
base_plate();

if (!vector) {
    pcb();

    for (layer=[1:1:layers]) {
        border_plate(layer_depth * layer);
    }

    if (switches) {
        for (column=[0:1:columns-1]) {
            for (row=[0:1:rows-1]) {
                key_switch(column, row);
            }
        }
    }
    
    key_plate();
}
else {
    translate([0, pcb_height + border_width*2 + 2, -plate_elevation])
        key_plate();
    if (double) {
        translate([pcb_width + border_width*2 + 2, 0, 0])
            base_plate();
        translate([pcb_width + border_width*2 + 2, pcb_height + border_width*2 + 2, -plate_elevation])
            key_plate();
    }
}
